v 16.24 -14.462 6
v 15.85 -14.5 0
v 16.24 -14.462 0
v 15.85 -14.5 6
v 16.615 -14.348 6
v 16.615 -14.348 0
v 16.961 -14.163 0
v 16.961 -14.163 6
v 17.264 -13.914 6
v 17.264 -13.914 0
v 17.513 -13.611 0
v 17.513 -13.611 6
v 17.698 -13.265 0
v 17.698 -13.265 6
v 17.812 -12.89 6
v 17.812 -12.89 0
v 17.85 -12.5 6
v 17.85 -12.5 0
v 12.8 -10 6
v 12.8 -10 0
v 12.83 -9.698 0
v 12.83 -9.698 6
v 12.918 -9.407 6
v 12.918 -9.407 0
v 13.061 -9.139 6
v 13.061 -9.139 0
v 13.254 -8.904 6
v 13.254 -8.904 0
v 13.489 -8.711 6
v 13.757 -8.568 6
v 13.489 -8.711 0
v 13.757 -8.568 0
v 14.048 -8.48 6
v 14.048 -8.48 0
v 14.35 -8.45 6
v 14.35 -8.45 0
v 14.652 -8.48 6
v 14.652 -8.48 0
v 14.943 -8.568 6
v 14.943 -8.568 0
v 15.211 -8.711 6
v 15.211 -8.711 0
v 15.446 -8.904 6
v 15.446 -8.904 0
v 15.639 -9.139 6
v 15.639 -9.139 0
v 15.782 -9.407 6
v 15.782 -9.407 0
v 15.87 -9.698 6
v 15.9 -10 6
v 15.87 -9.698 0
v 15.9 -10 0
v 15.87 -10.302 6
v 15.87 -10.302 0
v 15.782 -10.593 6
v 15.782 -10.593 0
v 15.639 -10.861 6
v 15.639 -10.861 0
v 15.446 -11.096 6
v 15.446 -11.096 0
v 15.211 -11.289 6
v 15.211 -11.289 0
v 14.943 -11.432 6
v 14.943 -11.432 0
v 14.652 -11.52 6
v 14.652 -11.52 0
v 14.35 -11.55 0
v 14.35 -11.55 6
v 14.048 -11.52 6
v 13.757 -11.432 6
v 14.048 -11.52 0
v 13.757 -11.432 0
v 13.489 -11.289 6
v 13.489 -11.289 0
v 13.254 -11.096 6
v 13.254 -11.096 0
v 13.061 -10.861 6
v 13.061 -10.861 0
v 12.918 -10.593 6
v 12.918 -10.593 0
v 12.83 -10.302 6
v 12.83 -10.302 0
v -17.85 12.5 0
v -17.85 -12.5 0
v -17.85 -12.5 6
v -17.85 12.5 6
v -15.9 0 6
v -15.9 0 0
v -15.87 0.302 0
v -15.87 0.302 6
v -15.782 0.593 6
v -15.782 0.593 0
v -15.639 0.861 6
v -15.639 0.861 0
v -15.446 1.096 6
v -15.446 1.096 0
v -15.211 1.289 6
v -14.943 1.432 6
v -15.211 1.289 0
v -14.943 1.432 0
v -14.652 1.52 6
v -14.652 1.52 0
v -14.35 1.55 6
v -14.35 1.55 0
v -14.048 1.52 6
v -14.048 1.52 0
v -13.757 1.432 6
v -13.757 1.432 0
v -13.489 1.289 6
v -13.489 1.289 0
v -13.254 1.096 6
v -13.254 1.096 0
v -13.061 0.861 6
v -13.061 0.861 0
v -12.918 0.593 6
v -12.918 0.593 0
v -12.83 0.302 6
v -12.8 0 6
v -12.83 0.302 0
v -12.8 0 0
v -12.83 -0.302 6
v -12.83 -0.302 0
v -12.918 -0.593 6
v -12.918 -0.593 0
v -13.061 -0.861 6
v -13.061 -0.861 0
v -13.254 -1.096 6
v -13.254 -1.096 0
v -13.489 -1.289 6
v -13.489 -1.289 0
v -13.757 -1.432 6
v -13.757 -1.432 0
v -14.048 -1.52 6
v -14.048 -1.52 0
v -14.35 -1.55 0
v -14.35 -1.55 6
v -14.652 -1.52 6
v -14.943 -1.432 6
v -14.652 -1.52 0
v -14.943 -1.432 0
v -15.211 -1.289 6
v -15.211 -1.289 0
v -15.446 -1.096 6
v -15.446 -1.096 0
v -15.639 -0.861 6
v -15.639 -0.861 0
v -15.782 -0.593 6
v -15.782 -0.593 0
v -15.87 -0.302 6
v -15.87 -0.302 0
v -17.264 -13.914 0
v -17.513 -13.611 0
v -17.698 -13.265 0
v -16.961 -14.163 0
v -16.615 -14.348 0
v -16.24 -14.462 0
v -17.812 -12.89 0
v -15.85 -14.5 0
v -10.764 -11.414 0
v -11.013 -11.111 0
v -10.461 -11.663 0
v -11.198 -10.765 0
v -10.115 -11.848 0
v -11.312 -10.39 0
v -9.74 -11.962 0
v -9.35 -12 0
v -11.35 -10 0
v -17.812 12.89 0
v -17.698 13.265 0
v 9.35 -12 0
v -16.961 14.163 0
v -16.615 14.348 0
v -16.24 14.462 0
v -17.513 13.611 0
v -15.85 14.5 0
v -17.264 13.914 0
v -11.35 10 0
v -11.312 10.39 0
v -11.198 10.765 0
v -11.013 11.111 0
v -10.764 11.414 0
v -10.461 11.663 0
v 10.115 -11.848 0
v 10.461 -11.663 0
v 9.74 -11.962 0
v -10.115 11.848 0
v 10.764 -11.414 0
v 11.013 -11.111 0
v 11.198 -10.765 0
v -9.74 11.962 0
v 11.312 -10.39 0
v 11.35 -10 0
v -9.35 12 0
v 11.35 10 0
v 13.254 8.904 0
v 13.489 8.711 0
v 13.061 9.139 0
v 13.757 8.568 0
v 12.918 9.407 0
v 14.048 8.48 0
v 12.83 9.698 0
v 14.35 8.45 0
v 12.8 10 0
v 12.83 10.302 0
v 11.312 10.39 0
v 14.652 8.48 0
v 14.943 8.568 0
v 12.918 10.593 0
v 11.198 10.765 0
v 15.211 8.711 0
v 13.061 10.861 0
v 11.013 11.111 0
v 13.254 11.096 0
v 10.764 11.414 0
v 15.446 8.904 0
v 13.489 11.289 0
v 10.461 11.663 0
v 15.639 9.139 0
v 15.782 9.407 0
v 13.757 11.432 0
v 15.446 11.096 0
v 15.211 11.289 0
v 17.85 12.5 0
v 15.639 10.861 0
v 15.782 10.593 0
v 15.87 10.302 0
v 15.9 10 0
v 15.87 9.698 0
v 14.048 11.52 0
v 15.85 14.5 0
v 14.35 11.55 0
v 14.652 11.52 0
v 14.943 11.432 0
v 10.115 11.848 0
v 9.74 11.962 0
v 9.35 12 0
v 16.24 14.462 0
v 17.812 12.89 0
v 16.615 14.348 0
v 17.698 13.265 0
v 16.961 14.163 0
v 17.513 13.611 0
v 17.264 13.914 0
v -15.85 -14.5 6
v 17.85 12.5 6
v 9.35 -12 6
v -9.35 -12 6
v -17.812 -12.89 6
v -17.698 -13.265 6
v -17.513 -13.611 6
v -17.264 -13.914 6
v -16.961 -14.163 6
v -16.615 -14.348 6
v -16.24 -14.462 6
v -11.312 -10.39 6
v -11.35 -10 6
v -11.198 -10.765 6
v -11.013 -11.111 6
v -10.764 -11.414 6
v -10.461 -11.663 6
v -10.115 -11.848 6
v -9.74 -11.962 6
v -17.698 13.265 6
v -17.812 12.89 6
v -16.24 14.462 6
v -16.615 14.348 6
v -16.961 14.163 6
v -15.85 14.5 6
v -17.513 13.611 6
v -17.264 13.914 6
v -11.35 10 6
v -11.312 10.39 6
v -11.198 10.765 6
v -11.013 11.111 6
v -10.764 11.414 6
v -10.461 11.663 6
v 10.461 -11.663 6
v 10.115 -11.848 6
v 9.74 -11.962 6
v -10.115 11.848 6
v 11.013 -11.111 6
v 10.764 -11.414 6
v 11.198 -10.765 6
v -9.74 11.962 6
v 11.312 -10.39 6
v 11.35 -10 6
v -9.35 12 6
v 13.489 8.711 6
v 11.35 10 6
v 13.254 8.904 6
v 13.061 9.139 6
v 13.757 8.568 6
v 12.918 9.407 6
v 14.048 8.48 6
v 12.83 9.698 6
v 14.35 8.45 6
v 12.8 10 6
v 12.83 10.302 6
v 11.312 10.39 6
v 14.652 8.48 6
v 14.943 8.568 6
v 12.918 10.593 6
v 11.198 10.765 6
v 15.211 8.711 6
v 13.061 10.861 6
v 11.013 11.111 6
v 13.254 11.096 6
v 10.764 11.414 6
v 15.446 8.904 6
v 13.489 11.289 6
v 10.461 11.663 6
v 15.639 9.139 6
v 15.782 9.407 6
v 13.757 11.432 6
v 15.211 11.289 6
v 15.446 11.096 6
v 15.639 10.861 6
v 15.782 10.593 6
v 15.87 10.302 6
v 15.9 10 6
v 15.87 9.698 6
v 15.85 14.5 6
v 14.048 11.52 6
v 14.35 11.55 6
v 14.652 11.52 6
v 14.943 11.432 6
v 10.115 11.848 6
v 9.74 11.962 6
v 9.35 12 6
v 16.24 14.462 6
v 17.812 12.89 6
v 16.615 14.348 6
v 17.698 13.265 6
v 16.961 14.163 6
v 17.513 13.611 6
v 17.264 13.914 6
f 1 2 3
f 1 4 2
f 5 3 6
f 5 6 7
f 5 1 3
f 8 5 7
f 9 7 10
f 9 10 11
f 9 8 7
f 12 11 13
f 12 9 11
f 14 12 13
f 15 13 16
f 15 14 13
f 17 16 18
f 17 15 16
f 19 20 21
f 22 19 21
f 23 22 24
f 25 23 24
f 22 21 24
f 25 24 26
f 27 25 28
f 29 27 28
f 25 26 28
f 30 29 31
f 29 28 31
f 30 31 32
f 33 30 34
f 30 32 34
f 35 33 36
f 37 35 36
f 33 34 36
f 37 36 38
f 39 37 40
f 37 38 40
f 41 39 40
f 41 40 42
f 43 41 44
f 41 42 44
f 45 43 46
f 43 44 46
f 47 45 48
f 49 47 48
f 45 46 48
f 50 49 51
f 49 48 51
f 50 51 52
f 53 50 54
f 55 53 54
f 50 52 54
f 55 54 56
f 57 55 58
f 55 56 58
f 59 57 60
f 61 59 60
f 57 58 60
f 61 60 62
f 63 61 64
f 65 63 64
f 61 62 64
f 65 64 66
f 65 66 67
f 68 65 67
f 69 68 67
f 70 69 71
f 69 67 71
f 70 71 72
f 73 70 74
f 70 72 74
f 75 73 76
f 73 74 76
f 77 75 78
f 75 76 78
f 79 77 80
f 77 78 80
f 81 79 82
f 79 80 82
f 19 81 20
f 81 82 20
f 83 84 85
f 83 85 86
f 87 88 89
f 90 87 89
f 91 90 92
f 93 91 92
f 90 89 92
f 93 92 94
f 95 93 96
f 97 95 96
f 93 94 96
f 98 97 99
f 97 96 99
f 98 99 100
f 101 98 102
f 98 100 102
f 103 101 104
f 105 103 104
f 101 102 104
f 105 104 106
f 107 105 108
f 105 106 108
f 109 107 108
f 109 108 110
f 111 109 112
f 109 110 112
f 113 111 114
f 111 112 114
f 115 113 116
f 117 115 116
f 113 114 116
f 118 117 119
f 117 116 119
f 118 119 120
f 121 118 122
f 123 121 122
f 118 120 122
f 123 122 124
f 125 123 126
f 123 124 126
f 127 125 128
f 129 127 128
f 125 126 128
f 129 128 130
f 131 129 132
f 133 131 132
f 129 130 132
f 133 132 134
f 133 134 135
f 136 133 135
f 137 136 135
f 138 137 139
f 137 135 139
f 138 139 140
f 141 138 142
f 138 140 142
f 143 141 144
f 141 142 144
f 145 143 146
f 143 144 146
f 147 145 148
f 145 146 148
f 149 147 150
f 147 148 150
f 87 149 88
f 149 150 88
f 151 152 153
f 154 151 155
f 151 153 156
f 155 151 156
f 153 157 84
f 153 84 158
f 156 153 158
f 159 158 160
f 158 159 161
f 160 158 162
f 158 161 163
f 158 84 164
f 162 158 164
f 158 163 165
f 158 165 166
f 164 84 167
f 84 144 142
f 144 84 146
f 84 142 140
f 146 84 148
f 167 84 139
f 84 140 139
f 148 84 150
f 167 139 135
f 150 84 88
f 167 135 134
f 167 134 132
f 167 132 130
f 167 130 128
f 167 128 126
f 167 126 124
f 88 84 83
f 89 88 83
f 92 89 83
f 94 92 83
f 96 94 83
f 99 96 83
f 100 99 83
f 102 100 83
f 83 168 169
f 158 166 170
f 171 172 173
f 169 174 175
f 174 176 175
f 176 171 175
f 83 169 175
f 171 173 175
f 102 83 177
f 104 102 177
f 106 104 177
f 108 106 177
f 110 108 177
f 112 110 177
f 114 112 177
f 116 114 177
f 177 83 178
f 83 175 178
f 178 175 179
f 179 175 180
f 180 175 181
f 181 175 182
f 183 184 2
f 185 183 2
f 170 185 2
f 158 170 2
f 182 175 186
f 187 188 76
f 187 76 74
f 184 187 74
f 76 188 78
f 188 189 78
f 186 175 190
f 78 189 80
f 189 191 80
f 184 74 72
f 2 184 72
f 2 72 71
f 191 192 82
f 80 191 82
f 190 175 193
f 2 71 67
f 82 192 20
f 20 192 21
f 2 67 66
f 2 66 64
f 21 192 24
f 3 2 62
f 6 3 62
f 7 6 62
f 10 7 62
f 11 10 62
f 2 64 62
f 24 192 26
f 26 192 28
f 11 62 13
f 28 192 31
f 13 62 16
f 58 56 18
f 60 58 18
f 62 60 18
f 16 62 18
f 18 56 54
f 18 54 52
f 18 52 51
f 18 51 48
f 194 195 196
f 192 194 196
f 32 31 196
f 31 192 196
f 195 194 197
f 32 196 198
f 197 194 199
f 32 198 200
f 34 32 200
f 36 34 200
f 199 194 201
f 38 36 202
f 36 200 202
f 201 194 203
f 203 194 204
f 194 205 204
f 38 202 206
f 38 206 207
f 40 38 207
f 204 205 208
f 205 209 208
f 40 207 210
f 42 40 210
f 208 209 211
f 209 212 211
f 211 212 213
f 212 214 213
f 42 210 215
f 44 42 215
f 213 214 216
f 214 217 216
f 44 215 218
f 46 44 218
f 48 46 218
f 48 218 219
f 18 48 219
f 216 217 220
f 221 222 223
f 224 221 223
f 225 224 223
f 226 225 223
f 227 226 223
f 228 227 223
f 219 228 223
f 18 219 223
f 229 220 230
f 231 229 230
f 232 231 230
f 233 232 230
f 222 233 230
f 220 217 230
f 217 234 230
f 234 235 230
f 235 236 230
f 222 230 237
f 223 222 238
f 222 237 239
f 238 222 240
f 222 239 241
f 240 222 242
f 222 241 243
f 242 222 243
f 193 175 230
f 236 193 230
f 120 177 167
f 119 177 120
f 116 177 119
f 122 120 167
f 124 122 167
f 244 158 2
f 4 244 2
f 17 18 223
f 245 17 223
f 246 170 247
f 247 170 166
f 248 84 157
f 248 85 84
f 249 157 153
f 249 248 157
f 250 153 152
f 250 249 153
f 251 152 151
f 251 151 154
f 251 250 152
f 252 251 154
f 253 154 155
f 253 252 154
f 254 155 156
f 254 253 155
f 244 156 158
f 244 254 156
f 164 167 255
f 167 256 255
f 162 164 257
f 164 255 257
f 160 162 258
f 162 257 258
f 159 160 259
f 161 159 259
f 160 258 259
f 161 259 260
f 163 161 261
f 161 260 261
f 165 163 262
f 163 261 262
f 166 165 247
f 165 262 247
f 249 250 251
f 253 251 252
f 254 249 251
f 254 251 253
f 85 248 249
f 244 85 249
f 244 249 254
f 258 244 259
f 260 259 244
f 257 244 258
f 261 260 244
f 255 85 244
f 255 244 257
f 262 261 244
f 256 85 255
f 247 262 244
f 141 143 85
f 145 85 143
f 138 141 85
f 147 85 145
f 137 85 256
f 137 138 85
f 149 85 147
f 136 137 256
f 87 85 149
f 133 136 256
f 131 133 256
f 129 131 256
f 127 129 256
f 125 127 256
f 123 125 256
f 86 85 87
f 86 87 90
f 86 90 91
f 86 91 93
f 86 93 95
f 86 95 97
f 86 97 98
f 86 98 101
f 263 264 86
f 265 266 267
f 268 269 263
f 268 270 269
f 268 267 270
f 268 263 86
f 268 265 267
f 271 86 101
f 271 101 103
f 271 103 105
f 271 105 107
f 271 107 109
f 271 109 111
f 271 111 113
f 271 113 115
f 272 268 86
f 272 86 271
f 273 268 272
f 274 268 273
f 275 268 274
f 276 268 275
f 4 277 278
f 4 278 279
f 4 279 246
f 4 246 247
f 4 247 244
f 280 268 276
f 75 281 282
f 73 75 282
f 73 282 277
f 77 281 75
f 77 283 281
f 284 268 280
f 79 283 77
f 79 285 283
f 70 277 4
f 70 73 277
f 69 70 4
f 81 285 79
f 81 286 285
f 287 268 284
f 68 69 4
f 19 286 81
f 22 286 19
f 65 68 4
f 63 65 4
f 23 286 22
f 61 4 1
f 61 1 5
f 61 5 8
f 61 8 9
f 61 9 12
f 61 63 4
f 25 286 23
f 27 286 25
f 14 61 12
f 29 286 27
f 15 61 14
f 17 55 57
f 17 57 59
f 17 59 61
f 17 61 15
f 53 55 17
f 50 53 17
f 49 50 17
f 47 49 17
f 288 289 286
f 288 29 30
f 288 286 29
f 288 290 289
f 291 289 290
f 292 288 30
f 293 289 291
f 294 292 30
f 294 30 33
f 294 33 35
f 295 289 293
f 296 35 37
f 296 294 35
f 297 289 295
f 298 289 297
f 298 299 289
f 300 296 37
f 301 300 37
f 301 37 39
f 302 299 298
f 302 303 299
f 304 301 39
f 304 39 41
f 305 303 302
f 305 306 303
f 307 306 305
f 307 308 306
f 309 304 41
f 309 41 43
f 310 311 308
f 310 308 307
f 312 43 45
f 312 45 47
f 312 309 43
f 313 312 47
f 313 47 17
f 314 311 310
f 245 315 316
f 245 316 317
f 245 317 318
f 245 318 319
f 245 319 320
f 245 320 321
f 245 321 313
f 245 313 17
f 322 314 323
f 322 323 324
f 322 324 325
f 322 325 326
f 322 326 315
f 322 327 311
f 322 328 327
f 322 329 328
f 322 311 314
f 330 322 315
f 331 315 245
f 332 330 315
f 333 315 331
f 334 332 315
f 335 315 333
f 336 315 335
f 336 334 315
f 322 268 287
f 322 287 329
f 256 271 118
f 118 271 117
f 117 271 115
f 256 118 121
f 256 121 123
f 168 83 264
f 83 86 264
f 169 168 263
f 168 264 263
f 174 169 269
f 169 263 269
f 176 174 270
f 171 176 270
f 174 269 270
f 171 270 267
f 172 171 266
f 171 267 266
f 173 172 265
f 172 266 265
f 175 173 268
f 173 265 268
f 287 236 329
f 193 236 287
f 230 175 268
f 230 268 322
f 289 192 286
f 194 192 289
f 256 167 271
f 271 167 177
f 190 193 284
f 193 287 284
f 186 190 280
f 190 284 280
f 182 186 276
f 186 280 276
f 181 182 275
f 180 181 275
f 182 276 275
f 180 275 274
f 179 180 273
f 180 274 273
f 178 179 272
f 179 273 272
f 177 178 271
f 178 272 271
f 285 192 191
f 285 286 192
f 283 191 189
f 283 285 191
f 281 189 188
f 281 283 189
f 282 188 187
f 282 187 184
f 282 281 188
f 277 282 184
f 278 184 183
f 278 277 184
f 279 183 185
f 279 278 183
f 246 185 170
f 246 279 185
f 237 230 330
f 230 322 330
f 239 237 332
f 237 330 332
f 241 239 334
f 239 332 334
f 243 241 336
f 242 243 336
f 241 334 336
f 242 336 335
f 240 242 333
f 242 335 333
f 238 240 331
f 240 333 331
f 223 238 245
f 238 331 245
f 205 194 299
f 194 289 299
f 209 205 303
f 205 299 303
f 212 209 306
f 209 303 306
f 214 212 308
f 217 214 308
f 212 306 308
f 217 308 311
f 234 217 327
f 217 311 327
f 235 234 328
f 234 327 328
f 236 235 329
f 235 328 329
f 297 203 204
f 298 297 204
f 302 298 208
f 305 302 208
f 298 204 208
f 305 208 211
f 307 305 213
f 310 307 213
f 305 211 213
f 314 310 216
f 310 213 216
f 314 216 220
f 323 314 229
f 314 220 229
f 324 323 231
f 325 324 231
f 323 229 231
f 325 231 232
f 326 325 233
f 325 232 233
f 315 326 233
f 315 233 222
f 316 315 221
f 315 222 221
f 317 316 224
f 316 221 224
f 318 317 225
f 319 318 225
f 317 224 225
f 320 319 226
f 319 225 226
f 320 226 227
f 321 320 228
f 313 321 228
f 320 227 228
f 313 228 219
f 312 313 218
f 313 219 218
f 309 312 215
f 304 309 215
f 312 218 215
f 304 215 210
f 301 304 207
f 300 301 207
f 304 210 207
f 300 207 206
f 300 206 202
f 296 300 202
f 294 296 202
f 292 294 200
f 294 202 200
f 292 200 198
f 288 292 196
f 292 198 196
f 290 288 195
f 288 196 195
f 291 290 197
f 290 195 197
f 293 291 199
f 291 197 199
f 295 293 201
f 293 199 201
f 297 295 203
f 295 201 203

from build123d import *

# Parameters (mm, degrees)
SKETCH_1_W          = 35.7
SKETCH_1_H          = 29
EXTRUDE_1_DEPTH     = 6
SKETCH_2_R          = 1.55
CUT_EXTRUDE_1_DEPTH = 6
SKETCH_3_W          = 22.7
SKETCH_3_H          = 24
CUT_EXTRUDE_2_DEPTH = 10
FILLET_1_R          = 2


with BuildPart() as part:
    # 草图1 → 凸台-拉伸1 (new body)
    with BuildSketch(Plane.XY):
        Rectangle(SKETCH_1_W, SKETCH_1_H)
    extrude(amount=EXTRUDE_1_DEPTH)

    # 草图2 → 切除-拉伸1 (cut)
    with BuildSketch(Plane(origin=(0, 0, 0), x_dir=(-1, 0, 0), z_dir=(0, 0, -1))):
        with Locations((14.35, 0)):
            Circle(SKETCH_2_R)
        with Locations((-14.35, 10)):
            Circle(SKETCH_2_R)
        with Locations((-14.35, -10)):
            Circle(SKETCH_2_R)
    extrude(amount=-CUT_EXTRUDE_1_DEPTH, mode=Mode.SUBTRACT)

    # 草图3 → 切除-拉伸2 (cut)
    with BuildSketch(Plane(origin=(0, 0, 0), x_dir=(-1, 0, 0), z_dir=(0, 0, -1))):
        Rectangle(SKETCH_3_W, SKETCH_3_H)
    extrude(amount=-CUT_EXTRUDE_2_DEPTH, mode=Mode.SUBTRACT)

    # 圆角1
    fillet_1_edges = [part.edges().sort_by_distance(p)[0] for p in [
        (-11.35, 12, 3),
        (-11.35, -12, 3),
        (11.35, -12, 3),
        (11.35, 12, 3),
        (17.85, -14.5, 3),
        (-17.85, -14.5, 3),
        (-17.85, 14.5, 3),
        (17.85, 14.5, 3),
    ]]
    fillet(fillet_1_edges, radius=FILLET_1_R)


solid = part.part
